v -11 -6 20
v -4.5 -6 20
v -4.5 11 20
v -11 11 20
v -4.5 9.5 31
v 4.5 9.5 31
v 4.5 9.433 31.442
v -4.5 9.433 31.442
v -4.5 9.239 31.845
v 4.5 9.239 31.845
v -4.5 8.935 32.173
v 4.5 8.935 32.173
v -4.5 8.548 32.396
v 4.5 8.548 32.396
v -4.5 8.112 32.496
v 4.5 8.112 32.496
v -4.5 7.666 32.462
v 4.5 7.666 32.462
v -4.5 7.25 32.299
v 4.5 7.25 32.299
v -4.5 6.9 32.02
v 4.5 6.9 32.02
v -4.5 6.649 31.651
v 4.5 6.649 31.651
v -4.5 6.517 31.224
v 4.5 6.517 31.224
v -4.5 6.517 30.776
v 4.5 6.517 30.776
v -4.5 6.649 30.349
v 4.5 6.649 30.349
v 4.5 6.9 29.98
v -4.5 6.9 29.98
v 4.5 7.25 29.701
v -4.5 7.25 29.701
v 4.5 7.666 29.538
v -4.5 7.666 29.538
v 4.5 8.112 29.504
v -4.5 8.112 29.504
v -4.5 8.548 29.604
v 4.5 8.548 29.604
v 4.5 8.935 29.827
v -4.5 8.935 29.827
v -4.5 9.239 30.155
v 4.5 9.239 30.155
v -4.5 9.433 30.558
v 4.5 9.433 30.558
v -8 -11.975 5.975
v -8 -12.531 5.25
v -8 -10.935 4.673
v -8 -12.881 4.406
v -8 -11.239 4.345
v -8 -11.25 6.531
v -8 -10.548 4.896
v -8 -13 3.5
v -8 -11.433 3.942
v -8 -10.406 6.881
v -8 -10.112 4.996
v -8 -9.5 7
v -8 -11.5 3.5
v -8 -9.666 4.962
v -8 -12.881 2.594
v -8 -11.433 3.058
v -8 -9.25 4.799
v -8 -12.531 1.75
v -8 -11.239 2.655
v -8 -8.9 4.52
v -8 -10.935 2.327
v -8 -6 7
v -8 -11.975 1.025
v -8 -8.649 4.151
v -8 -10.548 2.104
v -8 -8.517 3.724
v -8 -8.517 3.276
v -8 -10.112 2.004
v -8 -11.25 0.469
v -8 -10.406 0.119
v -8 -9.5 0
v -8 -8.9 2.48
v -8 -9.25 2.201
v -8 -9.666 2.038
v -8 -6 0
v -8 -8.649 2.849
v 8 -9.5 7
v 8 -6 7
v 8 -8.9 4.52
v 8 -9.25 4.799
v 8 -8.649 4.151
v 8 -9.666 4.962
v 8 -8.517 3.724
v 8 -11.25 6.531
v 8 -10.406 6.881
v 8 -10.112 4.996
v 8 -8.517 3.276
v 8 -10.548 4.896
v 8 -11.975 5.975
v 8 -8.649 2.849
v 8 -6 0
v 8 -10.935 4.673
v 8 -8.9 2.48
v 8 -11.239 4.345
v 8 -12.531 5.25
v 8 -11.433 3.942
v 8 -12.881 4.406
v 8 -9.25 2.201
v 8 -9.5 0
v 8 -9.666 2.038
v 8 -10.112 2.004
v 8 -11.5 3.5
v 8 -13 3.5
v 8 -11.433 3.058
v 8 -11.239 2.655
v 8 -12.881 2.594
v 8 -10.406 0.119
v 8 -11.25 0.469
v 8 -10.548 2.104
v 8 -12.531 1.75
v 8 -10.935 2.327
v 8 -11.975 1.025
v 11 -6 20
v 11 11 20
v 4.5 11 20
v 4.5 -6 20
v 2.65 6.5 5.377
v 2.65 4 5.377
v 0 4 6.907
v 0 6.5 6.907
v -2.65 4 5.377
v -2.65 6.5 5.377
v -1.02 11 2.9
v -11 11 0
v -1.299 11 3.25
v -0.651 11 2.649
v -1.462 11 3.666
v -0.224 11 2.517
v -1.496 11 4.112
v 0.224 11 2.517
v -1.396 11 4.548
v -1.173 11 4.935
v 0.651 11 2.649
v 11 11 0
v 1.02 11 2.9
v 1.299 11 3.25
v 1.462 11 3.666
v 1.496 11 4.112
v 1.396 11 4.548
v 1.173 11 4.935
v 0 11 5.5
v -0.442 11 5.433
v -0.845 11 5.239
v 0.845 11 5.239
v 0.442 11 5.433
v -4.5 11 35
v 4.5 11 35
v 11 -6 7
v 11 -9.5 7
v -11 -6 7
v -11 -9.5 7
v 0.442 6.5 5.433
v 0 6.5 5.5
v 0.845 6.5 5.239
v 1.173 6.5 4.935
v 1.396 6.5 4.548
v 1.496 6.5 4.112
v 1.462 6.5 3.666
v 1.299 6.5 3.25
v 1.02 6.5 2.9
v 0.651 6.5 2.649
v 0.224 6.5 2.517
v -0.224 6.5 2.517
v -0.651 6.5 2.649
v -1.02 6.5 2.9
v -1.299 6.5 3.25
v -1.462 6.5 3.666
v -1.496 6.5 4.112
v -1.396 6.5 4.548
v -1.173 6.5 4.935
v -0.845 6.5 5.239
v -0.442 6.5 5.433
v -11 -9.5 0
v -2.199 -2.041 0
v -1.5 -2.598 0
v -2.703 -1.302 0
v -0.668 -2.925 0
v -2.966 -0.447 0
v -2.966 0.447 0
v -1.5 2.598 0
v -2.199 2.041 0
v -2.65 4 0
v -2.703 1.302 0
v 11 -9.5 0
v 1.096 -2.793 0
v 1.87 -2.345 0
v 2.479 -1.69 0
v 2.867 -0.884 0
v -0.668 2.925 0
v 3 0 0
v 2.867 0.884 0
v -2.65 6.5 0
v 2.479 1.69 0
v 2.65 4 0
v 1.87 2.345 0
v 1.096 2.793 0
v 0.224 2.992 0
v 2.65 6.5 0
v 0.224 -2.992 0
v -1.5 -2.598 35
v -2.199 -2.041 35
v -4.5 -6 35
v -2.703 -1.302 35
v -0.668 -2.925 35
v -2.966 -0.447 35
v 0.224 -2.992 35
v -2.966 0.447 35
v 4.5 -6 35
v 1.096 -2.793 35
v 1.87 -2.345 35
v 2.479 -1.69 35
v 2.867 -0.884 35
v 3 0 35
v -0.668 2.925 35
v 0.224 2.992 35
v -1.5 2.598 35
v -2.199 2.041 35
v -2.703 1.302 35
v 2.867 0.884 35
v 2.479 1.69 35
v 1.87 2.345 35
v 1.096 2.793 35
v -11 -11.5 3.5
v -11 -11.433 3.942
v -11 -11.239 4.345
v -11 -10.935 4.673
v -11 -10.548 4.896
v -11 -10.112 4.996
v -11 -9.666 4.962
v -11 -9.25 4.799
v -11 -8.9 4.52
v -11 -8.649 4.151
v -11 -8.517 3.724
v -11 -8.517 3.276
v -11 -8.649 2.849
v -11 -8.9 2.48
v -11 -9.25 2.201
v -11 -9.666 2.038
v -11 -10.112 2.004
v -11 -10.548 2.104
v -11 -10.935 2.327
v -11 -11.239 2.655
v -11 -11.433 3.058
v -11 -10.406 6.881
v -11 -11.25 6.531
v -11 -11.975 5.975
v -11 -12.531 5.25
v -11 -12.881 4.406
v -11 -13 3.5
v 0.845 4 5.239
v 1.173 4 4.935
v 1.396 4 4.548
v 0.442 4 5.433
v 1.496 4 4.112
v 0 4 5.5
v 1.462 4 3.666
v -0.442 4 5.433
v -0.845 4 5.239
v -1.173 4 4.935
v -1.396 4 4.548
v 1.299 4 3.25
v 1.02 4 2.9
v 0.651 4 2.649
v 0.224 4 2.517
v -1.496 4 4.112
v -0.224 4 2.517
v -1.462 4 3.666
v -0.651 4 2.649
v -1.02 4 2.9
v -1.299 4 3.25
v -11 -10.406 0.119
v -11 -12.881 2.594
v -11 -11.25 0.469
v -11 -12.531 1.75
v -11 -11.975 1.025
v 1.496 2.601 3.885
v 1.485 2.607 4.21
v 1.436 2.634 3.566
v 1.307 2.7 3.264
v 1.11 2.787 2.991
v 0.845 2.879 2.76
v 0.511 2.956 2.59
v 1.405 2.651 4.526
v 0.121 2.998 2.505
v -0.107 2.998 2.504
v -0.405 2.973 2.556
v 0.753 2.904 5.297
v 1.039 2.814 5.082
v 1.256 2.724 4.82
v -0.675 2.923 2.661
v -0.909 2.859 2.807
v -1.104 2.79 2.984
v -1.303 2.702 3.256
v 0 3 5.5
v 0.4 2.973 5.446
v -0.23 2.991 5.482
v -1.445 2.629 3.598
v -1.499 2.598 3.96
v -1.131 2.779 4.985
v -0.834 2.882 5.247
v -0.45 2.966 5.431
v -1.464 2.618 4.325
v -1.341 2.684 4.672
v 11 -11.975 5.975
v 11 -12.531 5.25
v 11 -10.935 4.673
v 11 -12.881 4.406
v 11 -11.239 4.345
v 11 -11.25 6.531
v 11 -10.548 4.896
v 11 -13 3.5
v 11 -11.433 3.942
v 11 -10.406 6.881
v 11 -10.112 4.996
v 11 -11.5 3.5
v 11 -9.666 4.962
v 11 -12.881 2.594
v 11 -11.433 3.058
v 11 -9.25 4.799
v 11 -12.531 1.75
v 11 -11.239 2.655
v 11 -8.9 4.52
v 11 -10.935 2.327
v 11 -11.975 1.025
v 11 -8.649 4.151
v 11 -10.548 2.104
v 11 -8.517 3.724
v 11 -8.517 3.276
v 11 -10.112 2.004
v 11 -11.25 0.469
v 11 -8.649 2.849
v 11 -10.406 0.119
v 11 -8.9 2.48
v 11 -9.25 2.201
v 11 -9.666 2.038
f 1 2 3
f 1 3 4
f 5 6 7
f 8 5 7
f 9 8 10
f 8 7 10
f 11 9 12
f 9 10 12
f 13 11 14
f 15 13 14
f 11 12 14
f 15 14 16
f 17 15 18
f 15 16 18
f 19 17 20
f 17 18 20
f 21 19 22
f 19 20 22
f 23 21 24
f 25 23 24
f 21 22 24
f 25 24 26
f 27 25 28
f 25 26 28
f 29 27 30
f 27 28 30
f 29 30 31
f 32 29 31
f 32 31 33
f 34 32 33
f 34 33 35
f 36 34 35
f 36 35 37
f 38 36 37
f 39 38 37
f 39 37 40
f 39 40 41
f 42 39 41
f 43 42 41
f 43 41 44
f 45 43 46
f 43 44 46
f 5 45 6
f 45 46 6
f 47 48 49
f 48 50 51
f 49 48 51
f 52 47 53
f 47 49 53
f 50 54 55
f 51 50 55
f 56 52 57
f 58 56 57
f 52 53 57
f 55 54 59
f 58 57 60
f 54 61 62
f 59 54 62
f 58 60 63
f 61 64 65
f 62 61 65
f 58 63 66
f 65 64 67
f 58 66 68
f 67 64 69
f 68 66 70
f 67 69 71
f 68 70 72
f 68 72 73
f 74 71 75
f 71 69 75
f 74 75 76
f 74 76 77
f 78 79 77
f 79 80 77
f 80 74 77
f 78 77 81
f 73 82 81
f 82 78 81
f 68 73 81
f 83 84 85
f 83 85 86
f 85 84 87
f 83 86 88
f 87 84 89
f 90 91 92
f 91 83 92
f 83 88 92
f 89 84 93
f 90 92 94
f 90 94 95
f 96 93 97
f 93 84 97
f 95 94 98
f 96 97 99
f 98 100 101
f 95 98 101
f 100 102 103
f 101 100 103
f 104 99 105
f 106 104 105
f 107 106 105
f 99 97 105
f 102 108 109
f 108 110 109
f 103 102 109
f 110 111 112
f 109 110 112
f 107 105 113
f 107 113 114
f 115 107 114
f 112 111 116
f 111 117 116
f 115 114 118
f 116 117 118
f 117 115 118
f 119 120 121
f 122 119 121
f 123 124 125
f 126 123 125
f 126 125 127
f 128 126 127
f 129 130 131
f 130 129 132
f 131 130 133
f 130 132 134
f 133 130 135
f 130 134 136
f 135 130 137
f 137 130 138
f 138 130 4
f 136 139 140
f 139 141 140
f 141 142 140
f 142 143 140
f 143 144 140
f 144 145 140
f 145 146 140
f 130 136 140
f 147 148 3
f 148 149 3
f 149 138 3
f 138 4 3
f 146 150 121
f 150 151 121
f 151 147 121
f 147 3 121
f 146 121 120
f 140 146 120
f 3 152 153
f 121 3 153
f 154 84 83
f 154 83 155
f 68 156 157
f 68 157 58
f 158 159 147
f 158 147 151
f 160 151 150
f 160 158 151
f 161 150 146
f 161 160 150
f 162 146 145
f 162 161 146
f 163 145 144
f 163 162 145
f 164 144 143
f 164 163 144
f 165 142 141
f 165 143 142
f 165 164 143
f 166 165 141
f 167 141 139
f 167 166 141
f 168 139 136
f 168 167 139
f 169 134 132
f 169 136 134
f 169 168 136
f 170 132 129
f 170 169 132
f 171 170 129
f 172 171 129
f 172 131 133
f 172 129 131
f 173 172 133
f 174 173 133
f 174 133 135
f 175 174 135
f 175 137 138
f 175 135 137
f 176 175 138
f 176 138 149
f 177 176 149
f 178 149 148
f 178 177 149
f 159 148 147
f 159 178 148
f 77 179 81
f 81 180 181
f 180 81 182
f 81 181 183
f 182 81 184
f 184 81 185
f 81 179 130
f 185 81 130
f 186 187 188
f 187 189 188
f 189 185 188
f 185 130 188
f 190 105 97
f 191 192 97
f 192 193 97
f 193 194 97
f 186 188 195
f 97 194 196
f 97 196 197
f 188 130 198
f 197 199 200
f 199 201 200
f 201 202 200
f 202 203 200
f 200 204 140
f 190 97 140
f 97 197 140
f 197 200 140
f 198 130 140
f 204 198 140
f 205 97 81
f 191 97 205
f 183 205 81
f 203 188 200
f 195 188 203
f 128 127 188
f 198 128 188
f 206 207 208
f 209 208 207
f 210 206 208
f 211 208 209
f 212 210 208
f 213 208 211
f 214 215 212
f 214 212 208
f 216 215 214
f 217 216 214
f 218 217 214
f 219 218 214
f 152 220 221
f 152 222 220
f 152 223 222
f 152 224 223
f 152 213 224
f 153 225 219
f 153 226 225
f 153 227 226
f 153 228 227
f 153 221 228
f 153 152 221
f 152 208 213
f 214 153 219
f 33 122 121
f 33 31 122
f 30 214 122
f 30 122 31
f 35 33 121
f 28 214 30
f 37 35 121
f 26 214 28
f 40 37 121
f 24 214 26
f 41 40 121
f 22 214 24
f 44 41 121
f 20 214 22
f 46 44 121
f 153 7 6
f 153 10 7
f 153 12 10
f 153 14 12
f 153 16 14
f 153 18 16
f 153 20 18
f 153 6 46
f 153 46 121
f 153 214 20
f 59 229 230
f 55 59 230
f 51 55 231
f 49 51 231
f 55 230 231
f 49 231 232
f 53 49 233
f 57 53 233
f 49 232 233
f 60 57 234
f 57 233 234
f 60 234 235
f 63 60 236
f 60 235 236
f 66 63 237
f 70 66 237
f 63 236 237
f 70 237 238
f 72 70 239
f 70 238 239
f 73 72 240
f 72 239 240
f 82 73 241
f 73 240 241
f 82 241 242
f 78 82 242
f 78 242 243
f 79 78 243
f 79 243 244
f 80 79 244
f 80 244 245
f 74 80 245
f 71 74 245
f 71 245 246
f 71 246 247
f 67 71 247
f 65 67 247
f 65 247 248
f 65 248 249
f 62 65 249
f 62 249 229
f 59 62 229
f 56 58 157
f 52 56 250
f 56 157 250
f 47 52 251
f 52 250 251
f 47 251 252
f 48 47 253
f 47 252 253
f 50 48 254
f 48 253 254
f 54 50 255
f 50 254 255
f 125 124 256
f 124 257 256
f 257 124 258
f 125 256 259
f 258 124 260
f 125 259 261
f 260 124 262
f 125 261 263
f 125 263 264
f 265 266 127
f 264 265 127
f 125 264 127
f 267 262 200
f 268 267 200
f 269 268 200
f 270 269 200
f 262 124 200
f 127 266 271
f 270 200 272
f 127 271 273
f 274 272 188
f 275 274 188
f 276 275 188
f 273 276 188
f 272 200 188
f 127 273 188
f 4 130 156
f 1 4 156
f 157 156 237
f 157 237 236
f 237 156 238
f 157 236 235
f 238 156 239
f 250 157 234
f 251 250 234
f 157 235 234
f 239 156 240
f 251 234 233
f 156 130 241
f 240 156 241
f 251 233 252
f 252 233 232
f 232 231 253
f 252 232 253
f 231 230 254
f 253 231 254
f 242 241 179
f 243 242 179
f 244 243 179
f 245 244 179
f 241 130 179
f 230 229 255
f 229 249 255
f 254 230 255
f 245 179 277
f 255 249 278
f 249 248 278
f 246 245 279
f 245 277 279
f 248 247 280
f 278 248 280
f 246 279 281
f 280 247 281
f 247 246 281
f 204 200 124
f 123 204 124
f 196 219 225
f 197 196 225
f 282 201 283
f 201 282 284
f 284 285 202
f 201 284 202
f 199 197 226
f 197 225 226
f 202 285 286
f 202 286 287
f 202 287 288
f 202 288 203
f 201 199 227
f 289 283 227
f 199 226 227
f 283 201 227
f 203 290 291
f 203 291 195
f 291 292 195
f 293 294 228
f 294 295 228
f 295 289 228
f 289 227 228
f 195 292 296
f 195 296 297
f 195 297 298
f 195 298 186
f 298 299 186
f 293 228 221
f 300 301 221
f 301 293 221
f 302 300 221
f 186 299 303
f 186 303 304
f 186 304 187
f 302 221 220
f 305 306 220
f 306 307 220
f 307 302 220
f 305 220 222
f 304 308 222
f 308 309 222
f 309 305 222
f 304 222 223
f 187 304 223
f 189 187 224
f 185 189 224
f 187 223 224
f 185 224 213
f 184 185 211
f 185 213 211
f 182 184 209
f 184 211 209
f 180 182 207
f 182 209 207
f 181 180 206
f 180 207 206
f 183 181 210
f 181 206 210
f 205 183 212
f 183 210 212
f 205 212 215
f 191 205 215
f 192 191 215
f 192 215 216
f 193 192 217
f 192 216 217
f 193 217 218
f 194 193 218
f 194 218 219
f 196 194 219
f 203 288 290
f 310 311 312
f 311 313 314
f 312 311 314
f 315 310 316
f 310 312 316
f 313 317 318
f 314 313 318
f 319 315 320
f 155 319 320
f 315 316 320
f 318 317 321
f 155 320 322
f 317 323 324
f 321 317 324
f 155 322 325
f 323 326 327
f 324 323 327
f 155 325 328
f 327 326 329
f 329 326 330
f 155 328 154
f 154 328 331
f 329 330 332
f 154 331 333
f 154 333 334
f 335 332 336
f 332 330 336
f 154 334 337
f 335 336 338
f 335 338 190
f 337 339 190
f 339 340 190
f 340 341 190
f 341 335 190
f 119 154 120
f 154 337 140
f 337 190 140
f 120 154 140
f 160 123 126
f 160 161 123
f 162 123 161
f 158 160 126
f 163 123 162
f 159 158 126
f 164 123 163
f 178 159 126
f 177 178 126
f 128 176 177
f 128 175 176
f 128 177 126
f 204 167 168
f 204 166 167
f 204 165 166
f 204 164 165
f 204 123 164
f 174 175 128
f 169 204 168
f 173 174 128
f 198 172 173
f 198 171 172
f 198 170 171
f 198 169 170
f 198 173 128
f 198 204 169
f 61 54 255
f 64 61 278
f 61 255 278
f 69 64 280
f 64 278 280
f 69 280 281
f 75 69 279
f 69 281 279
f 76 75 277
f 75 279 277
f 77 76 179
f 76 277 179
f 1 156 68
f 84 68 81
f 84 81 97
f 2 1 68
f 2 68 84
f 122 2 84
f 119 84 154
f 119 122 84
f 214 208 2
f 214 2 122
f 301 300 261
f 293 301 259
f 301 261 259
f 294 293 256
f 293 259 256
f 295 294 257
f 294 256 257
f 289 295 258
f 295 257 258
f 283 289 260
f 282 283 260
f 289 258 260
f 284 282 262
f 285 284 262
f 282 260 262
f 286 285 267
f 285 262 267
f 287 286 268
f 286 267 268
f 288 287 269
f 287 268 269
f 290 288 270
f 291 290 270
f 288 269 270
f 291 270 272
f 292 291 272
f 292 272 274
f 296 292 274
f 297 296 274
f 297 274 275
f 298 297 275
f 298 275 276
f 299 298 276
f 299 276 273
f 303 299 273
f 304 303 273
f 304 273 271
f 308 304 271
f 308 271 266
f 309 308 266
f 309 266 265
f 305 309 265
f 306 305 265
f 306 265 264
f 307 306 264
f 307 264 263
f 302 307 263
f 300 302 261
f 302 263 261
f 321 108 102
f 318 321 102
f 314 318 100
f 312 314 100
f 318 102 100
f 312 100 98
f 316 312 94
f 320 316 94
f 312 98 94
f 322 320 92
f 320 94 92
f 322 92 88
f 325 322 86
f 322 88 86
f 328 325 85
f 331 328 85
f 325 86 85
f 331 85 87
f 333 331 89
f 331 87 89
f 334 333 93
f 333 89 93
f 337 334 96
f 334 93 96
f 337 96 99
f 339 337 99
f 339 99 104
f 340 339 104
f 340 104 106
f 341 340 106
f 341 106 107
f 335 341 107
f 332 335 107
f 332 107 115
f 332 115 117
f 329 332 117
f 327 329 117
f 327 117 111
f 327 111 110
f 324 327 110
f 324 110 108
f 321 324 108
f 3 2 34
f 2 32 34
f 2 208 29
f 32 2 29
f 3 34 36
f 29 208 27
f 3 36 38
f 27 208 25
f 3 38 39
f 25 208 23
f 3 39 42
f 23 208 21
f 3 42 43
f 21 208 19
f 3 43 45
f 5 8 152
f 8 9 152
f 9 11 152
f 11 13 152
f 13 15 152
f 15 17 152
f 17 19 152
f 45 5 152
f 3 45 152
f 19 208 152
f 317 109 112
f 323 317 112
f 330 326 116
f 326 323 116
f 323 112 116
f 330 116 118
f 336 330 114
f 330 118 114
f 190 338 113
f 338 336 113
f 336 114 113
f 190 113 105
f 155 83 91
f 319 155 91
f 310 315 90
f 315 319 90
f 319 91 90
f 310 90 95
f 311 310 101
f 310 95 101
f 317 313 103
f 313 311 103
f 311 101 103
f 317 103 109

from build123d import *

# Parameters (mm, degrees)
DODANIE_WYCI_GNI_CIE1_DEPTH            = 7
WYTNIJ_WYCI_GNI_CIE1_REACH             = 28.495
WYTNIJ_WYCI_GNI_CIE2_REACH             = 28.495
SZKIC3_R                               = 1.5
SZKIC4_W                               = 22
SZKIC4_H                               = 17
DODANIE_WYCI_GNI_CIE2_DEPTH            = 20
SZKIC5_R                               = 3
WYTNIJ_WYCI_GNI_CIE3_DEPTH             = 20
WYTNIJ_WYCI_GNI_CIE4_DEPTH             = 2.5
WYTNIJ_WYCI_GNI_CIE5_REACH             = 30.46
SZKIC7_R                               = 1.5
WYTNIJ_WYCI_GNI_CIE5_DIRECTION_2_REACH = 30.46
DODANIE_WYCI_GNI_CIE3_START            = 15
SZKIC8_W                               = 9
SZKIC8_H                               = 17
SZKIC8_R                               = 3
DODANIE_WYCI_GNI_CIE3_DEPTH            = 15
SZKIC9_R                               = 1.5
WYTNIJ_WYCI_GNI_CIE6_DEPTH             = 9


with BuildPart() as part:
    # Szkic1 → Dodanie-wyciągnięcie1 (new body)
    with BuildSketch(Plane.XY):
        Polygon((8, 6), (-8, 6), (-11, 6), (-11, -13), (-8, -13), (-8, -6), (8, -6), (8, -13), (11, -13), (11, 6), align=None)
    extrude(amount=DODANIE_WYCI_GNI_CIE1_DEPTH)

    # Wytnij-wyciągnięcie1: up to this face of the body (flat: up to its plane)
    wytnij_wyci_gni_cie1_end = Plane(part.part.faces().sort_by_distance((11, -3.5, 3.5))[0])
    # Szkic2 → Wytnij-wyciągnięcie1 (cut, up to the picked face)
    with BuildSketch(Plane.ZY.offset(11), mode=Mode.PRIVATE) as wytnij_wyci_gni_cie1_sk1:
        with BuildLine():
            ThreePointArc((7, -9.5), (5.974873734, -11.974873734), (3.5, -13))
            Line((3.5, -13), (7, -13))
            Line((7, -13), (7, -9.5))
        make_face()
    wytnij_wyci_gni_cie1_tool1 = split(extrude(wytnij_wyci_gni_cie1_sk1.sketch, amount=-WYTNIJ_WYCI_GNI_CIE1_REACH, mode=Mode.PRIVATE), bisect_by=wytnij_wyci_gni_cie1_end, keep=Keep.BOTH, mode=Mode.PRIVATE)
    # Szkic2 → Wytnij-wyciągnięcie1 (cut, up to the picked face)
    with BuildSketch(Plane.ZY.offset(11), mode=Mode.PRIVATE) as wytnij_wyci_gni_cie1_sk2:
        with BuildLine():
            ThreePointArc((3.5, -13), (1.025126266, -11.974873734), (0, -9.5))
            Line((0, -9.5), (0, -13))
            Line((0, -13), (3.5, -13))
        make_face()
    wytnij_wyci_gni_cie1_tool2 = split(extrude(wytnij_wyci_gni_cie1_sk2.sketch, amount=-WYTNIJ_WYCI_GNI_CIE1_REACH, mode=Mode.PRIVATE), bisect_by=wytnij_wyci_gni_cie1_end, keep=Keep.BOTH, mode=Mode.PRIVATE)
    add(wytnij_wyci_gni_cie1_tool1.solids().sort_by(Axis((-11, -12.218212, 6.218212), (1, 0, 0)))[0], mode=Mode.SUBTRACT)
    add(wytnij_wyci_gni_cie1_tool2.solids().sort_by(Axis((-11, -12.218212, 0.781788), (1, 0, 0)))[0], mode=Mode.SUBTRACT)

    # Wytnij-wyciągnięcie2: up to this face of the body (flat: up to its plane)
    wytnij_wyci_gni_cie2_end = Plane(part.part.faces().sort_by_distance((11, -3.141167, 3.5))[0])
    # Szkic3 → Wytnij-wyciągnięcie2 (cut, up to the picked face)
    with BuildSketch(Plane.ZY.offset(11), mode=Mode.PRIVATE) as wytnij_wyci_gni_cie2_sk1:
        with Locations(Location((3.5, -10, 0), (0, 0, 270))):
            Circle(SZKIC3_R)
    wytnij_wyci_gni_cie2_tool1 = split(extrude(wytnij_wyci_gni_cie2_sk1.sketch, amount=-WYTNIJ_WYCI_GNI_CIE2_REACH, mode=Mode.PRIVATE), bisect_by=wytnij_wyci_gni_cie2_end, keep=Keep.BOTH, mode=Mode.PRIVATE)
    add(wytnij_wyci_gni_cie2_tool1.solids().sort_by(Axis((-11, -10, 3.5), (1, 0, 0)))[0], mode=Mode.SUBTRACT)

    # Szkic4 → Dodanie-wyciągnięcie2 (add)
    with BuildSketch(Plane(origin=(0, 0, 0), x_dir=(-1, 0, 0), z_dir=(0, 0, -1))):
        with Locations((0, 2.5)):
            Rectangle(SZKIC4_W, SZKIC4_H)
    extrude(amount=-DODANIE_WYCI_GNI_CIE2_DEPTH)

    # Szkic5 → Wytnij-wyciągnięcie3 (cut)
    with BuildSketch(Plane.XY.offset(20)):
        Circle(SZKIC5_R)
    extrude(amount=-WYTNIJ_WYCI_GNI_CIE3_DEPTH, mode=Mode.SUBTRACT)

    # Szkic6 → Wytnij-wyciągnięcie4 (cut)
    with BuildSketch(Plane(origin=(0, 4, 0), x_dir=(-1, 0, 0), z_dir=(0, -1, 0))):
        Polygon((2.65, -2.316843521), (2.65, 0), (-2.65, 0), (-2.65, -2.316843521), (-2.65, -5.376799948), (0, -6.906778161), (2.65, -5.376799948), align=None)
    extrude(amount=-WYTNIJ_WYCI_GNI_CIE4_DEPTH, mode=Mode.SUBTRACT)

    # Szkic7 → Wytnij-wyciągnięcie5 (cut, up to next)
    with BuildSketch(Plane(origin=(0, 4, 0), x_dir=(1, 0, 0), z_dir=(0, 1, 0)), mode=Mode.PRIVATE) as wytnij_wyci_gni_cie5_sk1:
        with Locations(Location((0, -4, 0), (0, 0, 270))):
            Circle(SZKIC7_R)
    wytnij_wyci_gni_cie5_tool1 = extrude(wytnij_wyci_gni_cie5_sk1.sketch, amount=-WYTNIJ_WYCI_GNI_CIE5_REACH, mode=Mode.PRIVATE) & part.part
    add(wytnij_wyci_gni_cie5_tool1.solids().sort_by_distance((0, 4, 4))[0], mode=Mode.SUBTRACT)

    # Szkic7 → Wytnij-wyciągnięcie5 direction 2 (cut, up to next)
    with BuildSketch(Plane(origin=(0, 4, 0), x_dir=(1, 0, 0), z_dir=(0, 1, 0)), mode=Mode.PRIVATE) as wytnij_wyci_gni_cie5_direction_2_sk1:
        with Locations(Location((0, -4, 0), (0, 0, 270))):
            Circle(SZKIC7_R)
    wytnij_wyci_gni_cie5_direction_2_tool1 = extrude(wytnij_wyci_gni_cie5_direction_2_sk1.sketch, amount=WYTNIJ_WYCI_GNI_CIE5_DIRECTION_2_REACH, mode=Mode.PRIVATE) & part.part
    add(wytnij_wyci_gni_cie5_direction_2_tool1.solids().sort_by_distance((0, 4, 4))[0], mode=Mode.SUBTRACT)

    # Szkic8 → Dodanie-wyciągnięcie3 (add)
    with BuildSketch(Plane.XY.offset(20).offset(DODANIE_WYCI_GNI_CIE3_START)):
        with Locations((0, 2.5)):
            Rectangle(SZKIC8_W, SZKIC8_H)
        Circle(SZKIC8_R, mode=Mode.SUBTRACT)
    extrude(amount=-DODANIE_WYCI_GNI_CIE3_DEPTH)

    # Szkic9 → Wytnij-wyciągnięcie6 (cut)
    with BuildSketch(Plane(origin=(4.5, 0, 0), x_dir=(0, 0, -1), z_dir=(1, 0, 0))):
        with Locations(Location((-31, 8, 0), (0, 0, 90))):
            Circle(SZKIC9_R)
    extrude(amount=-WYTNIJ_WYCI_GNI_CIE6_DEPTH, mode=Mode.SUBTRACT)


solid = part.part
